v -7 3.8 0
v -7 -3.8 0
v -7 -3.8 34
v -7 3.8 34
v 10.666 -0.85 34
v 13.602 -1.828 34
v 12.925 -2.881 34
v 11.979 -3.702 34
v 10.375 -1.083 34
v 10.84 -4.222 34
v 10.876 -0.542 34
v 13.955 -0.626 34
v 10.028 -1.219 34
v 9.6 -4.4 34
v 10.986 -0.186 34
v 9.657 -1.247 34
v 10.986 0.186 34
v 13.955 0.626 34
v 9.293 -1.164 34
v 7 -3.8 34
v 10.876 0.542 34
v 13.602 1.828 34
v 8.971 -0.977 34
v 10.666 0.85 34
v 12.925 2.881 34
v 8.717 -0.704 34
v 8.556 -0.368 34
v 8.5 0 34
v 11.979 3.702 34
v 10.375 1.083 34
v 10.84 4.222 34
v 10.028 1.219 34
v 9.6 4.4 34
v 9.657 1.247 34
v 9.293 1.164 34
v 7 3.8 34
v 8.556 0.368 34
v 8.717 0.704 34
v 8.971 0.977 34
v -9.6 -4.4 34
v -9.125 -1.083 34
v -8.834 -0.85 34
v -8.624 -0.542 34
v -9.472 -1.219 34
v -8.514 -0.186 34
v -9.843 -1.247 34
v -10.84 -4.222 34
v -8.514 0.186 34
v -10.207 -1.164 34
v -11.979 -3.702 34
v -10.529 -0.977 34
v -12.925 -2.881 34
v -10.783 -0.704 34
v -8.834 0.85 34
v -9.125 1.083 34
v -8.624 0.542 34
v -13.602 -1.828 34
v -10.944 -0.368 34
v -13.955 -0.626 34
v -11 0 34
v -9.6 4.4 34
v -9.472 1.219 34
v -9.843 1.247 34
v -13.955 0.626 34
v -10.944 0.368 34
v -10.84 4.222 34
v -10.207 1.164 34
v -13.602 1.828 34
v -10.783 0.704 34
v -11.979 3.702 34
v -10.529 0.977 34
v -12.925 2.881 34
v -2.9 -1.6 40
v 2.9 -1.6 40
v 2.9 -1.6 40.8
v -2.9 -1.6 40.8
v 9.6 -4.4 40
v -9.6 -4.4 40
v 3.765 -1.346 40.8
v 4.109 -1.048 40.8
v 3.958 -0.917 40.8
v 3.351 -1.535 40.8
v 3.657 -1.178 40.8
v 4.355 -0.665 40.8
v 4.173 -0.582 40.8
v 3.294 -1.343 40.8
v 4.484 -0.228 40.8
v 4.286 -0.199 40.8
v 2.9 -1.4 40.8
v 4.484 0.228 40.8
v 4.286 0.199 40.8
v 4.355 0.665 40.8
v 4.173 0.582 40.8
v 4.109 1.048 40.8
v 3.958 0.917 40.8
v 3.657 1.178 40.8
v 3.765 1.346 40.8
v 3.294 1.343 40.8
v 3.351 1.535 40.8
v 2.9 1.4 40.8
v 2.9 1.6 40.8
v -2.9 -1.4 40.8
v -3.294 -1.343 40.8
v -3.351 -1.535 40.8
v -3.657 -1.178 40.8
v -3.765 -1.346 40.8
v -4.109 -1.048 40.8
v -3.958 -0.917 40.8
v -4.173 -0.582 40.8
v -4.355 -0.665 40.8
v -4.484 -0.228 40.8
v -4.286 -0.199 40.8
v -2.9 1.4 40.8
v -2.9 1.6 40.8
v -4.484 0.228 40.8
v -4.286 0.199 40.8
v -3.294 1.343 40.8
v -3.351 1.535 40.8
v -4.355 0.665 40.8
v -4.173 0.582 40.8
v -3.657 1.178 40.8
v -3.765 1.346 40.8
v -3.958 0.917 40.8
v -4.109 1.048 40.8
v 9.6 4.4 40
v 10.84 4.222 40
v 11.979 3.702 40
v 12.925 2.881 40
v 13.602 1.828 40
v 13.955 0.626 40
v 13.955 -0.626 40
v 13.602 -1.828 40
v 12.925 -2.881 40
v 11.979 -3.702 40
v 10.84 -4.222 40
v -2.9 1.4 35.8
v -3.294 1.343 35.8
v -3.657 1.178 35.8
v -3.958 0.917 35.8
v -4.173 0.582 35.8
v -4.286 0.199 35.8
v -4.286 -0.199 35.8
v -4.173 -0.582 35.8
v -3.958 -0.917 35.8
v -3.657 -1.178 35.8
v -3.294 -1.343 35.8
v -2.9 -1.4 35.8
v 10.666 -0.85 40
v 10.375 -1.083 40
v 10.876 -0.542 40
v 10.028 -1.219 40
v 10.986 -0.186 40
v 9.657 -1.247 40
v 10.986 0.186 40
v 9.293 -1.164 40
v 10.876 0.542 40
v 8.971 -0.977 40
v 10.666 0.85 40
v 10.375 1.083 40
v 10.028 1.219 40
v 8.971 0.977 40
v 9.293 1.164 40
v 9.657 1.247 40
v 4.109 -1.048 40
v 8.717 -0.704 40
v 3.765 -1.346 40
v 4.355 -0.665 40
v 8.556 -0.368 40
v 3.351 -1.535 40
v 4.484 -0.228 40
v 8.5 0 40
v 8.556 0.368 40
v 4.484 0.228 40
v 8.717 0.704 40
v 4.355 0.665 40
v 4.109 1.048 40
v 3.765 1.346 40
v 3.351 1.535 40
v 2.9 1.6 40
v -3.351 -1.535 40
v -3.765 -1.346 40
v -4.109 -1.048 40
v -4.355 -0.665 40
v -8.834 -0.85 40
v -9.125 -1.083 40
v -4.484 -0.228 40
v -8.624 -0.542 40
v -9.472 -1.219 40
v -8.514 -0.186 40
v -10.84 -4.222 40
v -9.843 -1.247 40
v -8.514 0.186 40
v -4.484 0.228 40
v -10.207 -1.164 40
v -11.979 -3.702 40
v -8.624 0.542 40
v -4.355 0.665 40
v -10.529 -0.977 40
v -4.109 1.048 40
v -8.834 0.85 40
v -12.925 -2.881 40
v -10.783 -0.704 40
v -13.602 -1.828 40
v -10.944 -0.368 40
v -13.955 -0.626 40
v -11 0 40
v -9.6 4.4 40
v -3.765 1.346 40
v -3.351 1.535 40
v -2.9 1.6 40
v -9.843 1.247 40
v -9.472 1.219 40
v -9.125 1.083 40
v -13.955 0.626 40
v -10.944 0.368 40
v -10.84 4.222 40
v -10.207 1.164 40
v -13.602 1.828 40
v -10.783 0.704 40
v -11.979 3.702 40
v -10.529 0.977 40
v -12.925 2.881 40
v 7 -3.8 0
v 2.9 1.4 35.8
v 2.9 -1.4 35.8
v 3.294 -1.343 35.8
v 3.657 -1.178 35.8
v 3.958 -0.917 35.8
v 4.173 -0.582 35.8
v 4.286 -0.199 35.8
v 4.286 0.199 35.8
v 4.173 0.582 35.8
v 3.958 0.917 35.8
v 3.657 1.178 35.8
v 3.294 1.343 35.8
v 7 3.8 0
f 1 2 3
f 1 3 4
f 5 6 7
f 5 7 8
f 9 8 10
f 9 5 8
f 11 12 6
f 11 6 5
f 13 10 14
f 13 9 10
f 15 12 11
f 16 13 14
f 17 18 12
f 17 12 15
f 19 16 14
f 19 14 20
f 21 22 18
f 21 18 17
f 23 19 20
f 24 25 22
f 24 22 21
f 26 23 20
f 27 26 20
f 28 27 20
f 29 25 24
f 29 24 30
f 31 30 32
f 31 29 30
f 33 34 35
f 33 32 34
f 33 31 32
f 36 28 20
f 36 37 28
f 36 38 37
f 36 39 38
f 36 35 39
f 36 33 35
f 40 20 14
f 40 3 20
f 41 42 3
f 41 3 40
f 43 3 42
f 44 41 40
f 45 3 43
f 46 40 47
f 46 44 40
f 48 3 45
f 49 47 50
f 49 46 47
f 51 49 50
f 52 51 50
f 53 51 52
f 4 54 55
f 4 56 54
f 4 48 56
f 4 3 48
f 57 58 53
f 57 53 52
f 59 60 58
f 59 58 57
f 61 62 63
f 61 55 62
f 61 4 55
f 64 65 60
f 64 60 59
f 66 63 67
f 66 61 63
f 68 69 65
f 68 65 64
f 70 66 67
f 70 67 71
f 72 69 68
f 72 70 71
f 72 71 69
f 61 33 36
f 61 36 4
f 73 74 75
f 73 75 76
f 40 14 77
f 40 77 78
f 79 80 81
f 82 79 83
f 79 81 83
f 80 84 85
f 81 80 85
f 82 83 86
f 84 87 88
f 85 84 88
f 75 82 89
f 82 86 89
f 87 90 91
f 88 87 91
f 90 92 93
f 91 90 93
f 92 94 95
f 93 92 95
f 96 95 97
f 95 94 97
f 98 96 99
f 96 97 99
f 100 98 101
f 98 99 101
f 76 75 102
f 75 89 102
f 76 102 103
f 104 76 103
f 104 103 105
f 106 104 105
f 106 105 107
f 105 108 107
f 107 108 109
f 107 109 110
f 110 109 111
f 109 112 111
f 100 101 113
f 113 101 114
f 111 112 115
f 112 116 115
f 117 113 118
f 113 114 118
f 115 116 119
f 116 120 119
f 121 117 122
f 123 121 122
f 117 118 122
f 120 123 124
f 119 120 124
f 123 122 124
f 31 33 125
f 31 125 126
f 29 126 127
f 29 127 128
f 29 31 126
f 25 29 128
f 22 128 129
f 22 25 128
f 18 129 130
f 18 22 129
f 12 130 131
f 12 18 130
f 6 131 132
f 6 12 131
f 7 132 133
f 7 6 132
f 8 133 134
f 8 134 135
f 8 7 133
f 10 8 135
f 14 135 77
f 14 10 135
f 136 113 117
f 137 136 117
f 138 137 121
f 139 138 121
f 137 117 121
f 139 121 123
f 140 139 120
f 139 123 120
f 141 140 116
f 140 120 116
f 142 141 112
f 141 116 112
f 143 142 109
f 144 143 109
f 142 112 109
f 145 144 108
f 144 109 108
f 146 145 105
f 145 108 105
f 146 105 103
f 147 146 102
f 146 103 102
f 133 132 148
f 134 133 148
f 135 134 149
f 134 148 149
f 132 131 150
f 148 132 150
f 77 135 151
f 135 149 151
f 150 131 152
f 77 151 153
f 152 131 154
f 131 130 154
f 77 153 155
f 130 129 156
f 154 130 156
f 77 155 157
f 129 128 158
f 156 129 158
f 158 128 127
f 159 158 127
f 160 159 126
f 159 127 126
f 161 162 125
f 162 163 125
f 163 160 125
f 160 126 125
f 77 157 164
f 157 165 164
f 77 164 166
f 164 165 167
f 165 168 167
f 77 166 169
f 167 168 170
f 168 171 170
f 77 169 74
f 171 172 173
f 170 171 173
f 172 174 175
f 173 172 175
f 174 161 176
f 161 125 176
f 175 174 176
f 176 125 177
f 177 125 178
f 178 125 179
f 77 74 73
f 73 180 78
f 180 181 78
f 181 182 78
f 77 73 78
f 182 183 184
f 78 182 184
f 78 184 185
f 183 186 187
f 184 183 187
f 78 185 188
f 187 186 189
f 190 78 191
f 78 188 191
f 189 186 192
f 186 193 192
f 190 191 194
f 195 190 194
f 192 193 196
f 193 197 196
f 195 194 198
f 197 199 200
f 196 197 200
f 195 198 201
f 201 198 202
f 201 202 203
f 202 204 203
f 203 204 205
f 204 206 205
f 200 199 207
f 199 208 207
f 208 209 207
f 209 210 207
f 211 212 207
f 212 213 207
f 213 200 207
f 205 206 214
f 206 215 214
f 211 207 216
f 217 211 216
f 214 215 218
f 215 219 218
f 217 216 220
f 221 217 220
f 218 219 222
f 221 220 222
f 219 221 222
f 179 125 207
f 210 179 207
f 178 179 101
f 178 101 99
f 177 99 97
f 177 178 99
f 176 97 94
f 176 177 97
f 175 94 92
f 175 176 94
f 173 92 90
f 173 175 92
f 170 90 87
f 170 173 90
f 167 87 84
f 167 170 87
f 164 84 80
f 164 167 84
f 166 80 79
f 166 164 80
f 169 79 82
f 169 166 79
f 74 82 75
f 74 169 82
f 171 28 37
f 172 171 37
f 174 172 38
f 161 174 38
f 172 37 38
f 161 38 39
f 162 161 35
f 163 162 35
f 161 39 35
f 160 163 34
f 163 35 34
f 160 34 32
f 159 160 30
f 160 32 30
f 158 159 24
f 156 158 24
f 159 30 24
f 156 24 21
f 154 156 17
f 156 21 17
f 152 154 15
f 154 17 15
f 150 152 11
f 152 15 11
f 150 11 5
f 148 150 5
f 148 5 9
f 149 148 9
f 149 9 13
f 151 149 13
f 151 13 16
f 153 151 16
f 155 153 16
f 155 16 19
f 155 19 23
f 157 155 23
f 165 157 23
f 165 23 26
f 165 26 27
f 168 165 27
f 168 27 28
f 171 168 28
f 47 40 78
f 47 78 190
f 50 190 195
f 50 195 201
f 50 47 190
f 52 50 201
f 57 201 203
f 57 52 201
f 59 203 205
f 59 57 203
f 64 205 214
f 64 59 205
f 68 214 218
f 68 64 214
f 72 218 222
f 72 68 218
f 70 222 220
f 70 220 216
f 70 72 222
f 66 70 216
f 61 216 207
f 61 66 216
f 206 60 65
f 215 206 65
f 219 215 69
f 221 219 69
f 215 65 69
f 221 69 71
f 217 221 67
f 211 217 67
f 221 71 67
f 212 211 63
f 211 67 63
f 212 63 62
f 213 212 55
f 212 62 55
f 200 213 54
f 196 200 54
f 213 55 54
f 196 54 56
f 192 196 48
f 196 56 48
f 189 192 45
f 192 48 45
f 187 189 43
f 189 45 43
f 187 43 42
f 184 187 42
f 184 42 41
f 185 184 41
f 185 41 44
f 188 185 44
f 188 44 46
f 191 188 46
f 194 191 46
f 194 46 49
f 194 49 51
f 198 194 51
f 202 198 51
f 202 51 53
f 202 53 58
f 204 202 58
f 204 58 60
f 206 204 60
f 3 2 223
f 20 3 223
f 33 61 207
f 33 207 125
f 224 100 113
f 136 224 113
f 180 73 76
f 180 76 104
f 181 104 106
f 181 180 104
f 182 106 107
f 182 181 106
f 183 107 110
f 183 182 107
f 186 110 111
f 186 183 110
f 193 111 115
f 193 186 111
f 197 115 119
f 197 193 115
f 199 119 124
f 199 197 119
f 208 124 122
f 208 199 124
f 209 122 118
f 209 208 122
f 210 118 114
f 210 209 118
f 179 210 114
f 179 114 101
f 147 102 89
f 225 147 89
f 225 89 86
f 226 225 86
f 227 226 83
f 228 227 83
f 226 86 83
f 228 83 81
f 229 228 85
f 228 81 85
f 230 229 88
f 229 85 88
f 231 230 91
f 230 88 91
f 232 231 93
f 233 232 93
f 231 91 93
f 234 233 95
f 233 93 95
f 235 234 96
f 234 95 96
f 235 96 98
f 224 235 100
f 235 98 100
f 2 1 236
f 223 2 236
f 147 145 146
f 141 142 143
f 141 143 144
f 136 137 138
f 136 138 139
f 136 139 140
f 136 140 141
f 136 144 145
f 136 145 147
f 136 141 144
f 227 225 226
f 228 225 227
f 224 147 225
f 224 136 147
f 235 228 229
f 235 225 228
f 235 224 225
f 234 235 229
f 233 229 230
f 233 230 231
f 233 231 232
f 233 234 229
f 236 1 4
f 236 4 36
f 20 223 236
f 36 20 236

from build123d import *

# Parameters (mm, degrees)
SKETCH_1_W          = 14
SKETCH_1_H          = 7.6
EXTRUDE_1_DEPTH     = 34
EXTRUDE_2_DEPTH     = 6
EXTRUDE_3_DEPTH     = 0.8
CUT_EXTRUDE_1_DEPTH = 5
HOLE_WIZARD_M3_1_D  = 2.5


with BuildPart() as part:
    # 草图1 → 凸台-拉伸1 (new body)
    with BuildSketch(Plane.XY):
        Rectangle(SKETCH_1_W, SKETCH_1_H)
    extrude(amount=EXTRUDE_1_DEPTH)

    # 草图2 → 凸台-拉伸2 (add)
    with BuildSketch(Plane.XY.offset(34)):
        with BuildLine():
            Line((-9.6, 4.4), (9.6, 4.4))
            ThreePointArc((9.6, 4.4), (14, 0), (9.6, -4.4))
            Line((9.6, -4.4), (-9.6, -4.4))
            ThreePointArc((-9.6, -4.4), (-14, 0), (-9.6, 4.4))
        make_face()
    extrude(amount=EXTRUDE_2_DEPTH)

    # 草图3 → 凸台-拉伸3 (add)
    with BuildSketch(Plane.XY.offset(40)):
        with BuildLine():
            Line((-2.9, 1.6), (2.9, 1.6))
            ThreePointArc((2.9, 1.6), (4.5, 0), (2.9, -1.6))
            Line((2.9, -1.6), (-2.9, -1.6))
            ThreePointArc((-2.9, -1.6), (-4.5, 0), (-2.9, 1.6))
        make_face()
    extrude(amount=EXTRUDE_3_DEPTH)

    # 草图4 → 切除-拉伸1 (cut)
    with BuildSketch(Plane.XY.offset(40.8)):
        with BuildLine():
            Line((-2.9, -1.4), (2.9, -1.4))
            ThreePointArc((2.9, -1.4), (4.3, 0), (2.9, 1.4))
            Line((2.9, 1.4), (-2.9, 1.4))
            ThreePointArc((-2.9, 1.4), (-4.3, 0), (-2.9, -1.4))
        make_face()
    extrude(amount=-CUT_EXTRUDE_1_DEPTH, mode=Mode.SUBTRACT)

    # M3 螺纹孔1 (through all)
    with Locations(Plane.XY.offset(40)):
        with Locations((-9.75, 0), (9.75, 0)):
            Hole(HOLE_WIZARD_M3_1_D / 2)


solid = part.part
